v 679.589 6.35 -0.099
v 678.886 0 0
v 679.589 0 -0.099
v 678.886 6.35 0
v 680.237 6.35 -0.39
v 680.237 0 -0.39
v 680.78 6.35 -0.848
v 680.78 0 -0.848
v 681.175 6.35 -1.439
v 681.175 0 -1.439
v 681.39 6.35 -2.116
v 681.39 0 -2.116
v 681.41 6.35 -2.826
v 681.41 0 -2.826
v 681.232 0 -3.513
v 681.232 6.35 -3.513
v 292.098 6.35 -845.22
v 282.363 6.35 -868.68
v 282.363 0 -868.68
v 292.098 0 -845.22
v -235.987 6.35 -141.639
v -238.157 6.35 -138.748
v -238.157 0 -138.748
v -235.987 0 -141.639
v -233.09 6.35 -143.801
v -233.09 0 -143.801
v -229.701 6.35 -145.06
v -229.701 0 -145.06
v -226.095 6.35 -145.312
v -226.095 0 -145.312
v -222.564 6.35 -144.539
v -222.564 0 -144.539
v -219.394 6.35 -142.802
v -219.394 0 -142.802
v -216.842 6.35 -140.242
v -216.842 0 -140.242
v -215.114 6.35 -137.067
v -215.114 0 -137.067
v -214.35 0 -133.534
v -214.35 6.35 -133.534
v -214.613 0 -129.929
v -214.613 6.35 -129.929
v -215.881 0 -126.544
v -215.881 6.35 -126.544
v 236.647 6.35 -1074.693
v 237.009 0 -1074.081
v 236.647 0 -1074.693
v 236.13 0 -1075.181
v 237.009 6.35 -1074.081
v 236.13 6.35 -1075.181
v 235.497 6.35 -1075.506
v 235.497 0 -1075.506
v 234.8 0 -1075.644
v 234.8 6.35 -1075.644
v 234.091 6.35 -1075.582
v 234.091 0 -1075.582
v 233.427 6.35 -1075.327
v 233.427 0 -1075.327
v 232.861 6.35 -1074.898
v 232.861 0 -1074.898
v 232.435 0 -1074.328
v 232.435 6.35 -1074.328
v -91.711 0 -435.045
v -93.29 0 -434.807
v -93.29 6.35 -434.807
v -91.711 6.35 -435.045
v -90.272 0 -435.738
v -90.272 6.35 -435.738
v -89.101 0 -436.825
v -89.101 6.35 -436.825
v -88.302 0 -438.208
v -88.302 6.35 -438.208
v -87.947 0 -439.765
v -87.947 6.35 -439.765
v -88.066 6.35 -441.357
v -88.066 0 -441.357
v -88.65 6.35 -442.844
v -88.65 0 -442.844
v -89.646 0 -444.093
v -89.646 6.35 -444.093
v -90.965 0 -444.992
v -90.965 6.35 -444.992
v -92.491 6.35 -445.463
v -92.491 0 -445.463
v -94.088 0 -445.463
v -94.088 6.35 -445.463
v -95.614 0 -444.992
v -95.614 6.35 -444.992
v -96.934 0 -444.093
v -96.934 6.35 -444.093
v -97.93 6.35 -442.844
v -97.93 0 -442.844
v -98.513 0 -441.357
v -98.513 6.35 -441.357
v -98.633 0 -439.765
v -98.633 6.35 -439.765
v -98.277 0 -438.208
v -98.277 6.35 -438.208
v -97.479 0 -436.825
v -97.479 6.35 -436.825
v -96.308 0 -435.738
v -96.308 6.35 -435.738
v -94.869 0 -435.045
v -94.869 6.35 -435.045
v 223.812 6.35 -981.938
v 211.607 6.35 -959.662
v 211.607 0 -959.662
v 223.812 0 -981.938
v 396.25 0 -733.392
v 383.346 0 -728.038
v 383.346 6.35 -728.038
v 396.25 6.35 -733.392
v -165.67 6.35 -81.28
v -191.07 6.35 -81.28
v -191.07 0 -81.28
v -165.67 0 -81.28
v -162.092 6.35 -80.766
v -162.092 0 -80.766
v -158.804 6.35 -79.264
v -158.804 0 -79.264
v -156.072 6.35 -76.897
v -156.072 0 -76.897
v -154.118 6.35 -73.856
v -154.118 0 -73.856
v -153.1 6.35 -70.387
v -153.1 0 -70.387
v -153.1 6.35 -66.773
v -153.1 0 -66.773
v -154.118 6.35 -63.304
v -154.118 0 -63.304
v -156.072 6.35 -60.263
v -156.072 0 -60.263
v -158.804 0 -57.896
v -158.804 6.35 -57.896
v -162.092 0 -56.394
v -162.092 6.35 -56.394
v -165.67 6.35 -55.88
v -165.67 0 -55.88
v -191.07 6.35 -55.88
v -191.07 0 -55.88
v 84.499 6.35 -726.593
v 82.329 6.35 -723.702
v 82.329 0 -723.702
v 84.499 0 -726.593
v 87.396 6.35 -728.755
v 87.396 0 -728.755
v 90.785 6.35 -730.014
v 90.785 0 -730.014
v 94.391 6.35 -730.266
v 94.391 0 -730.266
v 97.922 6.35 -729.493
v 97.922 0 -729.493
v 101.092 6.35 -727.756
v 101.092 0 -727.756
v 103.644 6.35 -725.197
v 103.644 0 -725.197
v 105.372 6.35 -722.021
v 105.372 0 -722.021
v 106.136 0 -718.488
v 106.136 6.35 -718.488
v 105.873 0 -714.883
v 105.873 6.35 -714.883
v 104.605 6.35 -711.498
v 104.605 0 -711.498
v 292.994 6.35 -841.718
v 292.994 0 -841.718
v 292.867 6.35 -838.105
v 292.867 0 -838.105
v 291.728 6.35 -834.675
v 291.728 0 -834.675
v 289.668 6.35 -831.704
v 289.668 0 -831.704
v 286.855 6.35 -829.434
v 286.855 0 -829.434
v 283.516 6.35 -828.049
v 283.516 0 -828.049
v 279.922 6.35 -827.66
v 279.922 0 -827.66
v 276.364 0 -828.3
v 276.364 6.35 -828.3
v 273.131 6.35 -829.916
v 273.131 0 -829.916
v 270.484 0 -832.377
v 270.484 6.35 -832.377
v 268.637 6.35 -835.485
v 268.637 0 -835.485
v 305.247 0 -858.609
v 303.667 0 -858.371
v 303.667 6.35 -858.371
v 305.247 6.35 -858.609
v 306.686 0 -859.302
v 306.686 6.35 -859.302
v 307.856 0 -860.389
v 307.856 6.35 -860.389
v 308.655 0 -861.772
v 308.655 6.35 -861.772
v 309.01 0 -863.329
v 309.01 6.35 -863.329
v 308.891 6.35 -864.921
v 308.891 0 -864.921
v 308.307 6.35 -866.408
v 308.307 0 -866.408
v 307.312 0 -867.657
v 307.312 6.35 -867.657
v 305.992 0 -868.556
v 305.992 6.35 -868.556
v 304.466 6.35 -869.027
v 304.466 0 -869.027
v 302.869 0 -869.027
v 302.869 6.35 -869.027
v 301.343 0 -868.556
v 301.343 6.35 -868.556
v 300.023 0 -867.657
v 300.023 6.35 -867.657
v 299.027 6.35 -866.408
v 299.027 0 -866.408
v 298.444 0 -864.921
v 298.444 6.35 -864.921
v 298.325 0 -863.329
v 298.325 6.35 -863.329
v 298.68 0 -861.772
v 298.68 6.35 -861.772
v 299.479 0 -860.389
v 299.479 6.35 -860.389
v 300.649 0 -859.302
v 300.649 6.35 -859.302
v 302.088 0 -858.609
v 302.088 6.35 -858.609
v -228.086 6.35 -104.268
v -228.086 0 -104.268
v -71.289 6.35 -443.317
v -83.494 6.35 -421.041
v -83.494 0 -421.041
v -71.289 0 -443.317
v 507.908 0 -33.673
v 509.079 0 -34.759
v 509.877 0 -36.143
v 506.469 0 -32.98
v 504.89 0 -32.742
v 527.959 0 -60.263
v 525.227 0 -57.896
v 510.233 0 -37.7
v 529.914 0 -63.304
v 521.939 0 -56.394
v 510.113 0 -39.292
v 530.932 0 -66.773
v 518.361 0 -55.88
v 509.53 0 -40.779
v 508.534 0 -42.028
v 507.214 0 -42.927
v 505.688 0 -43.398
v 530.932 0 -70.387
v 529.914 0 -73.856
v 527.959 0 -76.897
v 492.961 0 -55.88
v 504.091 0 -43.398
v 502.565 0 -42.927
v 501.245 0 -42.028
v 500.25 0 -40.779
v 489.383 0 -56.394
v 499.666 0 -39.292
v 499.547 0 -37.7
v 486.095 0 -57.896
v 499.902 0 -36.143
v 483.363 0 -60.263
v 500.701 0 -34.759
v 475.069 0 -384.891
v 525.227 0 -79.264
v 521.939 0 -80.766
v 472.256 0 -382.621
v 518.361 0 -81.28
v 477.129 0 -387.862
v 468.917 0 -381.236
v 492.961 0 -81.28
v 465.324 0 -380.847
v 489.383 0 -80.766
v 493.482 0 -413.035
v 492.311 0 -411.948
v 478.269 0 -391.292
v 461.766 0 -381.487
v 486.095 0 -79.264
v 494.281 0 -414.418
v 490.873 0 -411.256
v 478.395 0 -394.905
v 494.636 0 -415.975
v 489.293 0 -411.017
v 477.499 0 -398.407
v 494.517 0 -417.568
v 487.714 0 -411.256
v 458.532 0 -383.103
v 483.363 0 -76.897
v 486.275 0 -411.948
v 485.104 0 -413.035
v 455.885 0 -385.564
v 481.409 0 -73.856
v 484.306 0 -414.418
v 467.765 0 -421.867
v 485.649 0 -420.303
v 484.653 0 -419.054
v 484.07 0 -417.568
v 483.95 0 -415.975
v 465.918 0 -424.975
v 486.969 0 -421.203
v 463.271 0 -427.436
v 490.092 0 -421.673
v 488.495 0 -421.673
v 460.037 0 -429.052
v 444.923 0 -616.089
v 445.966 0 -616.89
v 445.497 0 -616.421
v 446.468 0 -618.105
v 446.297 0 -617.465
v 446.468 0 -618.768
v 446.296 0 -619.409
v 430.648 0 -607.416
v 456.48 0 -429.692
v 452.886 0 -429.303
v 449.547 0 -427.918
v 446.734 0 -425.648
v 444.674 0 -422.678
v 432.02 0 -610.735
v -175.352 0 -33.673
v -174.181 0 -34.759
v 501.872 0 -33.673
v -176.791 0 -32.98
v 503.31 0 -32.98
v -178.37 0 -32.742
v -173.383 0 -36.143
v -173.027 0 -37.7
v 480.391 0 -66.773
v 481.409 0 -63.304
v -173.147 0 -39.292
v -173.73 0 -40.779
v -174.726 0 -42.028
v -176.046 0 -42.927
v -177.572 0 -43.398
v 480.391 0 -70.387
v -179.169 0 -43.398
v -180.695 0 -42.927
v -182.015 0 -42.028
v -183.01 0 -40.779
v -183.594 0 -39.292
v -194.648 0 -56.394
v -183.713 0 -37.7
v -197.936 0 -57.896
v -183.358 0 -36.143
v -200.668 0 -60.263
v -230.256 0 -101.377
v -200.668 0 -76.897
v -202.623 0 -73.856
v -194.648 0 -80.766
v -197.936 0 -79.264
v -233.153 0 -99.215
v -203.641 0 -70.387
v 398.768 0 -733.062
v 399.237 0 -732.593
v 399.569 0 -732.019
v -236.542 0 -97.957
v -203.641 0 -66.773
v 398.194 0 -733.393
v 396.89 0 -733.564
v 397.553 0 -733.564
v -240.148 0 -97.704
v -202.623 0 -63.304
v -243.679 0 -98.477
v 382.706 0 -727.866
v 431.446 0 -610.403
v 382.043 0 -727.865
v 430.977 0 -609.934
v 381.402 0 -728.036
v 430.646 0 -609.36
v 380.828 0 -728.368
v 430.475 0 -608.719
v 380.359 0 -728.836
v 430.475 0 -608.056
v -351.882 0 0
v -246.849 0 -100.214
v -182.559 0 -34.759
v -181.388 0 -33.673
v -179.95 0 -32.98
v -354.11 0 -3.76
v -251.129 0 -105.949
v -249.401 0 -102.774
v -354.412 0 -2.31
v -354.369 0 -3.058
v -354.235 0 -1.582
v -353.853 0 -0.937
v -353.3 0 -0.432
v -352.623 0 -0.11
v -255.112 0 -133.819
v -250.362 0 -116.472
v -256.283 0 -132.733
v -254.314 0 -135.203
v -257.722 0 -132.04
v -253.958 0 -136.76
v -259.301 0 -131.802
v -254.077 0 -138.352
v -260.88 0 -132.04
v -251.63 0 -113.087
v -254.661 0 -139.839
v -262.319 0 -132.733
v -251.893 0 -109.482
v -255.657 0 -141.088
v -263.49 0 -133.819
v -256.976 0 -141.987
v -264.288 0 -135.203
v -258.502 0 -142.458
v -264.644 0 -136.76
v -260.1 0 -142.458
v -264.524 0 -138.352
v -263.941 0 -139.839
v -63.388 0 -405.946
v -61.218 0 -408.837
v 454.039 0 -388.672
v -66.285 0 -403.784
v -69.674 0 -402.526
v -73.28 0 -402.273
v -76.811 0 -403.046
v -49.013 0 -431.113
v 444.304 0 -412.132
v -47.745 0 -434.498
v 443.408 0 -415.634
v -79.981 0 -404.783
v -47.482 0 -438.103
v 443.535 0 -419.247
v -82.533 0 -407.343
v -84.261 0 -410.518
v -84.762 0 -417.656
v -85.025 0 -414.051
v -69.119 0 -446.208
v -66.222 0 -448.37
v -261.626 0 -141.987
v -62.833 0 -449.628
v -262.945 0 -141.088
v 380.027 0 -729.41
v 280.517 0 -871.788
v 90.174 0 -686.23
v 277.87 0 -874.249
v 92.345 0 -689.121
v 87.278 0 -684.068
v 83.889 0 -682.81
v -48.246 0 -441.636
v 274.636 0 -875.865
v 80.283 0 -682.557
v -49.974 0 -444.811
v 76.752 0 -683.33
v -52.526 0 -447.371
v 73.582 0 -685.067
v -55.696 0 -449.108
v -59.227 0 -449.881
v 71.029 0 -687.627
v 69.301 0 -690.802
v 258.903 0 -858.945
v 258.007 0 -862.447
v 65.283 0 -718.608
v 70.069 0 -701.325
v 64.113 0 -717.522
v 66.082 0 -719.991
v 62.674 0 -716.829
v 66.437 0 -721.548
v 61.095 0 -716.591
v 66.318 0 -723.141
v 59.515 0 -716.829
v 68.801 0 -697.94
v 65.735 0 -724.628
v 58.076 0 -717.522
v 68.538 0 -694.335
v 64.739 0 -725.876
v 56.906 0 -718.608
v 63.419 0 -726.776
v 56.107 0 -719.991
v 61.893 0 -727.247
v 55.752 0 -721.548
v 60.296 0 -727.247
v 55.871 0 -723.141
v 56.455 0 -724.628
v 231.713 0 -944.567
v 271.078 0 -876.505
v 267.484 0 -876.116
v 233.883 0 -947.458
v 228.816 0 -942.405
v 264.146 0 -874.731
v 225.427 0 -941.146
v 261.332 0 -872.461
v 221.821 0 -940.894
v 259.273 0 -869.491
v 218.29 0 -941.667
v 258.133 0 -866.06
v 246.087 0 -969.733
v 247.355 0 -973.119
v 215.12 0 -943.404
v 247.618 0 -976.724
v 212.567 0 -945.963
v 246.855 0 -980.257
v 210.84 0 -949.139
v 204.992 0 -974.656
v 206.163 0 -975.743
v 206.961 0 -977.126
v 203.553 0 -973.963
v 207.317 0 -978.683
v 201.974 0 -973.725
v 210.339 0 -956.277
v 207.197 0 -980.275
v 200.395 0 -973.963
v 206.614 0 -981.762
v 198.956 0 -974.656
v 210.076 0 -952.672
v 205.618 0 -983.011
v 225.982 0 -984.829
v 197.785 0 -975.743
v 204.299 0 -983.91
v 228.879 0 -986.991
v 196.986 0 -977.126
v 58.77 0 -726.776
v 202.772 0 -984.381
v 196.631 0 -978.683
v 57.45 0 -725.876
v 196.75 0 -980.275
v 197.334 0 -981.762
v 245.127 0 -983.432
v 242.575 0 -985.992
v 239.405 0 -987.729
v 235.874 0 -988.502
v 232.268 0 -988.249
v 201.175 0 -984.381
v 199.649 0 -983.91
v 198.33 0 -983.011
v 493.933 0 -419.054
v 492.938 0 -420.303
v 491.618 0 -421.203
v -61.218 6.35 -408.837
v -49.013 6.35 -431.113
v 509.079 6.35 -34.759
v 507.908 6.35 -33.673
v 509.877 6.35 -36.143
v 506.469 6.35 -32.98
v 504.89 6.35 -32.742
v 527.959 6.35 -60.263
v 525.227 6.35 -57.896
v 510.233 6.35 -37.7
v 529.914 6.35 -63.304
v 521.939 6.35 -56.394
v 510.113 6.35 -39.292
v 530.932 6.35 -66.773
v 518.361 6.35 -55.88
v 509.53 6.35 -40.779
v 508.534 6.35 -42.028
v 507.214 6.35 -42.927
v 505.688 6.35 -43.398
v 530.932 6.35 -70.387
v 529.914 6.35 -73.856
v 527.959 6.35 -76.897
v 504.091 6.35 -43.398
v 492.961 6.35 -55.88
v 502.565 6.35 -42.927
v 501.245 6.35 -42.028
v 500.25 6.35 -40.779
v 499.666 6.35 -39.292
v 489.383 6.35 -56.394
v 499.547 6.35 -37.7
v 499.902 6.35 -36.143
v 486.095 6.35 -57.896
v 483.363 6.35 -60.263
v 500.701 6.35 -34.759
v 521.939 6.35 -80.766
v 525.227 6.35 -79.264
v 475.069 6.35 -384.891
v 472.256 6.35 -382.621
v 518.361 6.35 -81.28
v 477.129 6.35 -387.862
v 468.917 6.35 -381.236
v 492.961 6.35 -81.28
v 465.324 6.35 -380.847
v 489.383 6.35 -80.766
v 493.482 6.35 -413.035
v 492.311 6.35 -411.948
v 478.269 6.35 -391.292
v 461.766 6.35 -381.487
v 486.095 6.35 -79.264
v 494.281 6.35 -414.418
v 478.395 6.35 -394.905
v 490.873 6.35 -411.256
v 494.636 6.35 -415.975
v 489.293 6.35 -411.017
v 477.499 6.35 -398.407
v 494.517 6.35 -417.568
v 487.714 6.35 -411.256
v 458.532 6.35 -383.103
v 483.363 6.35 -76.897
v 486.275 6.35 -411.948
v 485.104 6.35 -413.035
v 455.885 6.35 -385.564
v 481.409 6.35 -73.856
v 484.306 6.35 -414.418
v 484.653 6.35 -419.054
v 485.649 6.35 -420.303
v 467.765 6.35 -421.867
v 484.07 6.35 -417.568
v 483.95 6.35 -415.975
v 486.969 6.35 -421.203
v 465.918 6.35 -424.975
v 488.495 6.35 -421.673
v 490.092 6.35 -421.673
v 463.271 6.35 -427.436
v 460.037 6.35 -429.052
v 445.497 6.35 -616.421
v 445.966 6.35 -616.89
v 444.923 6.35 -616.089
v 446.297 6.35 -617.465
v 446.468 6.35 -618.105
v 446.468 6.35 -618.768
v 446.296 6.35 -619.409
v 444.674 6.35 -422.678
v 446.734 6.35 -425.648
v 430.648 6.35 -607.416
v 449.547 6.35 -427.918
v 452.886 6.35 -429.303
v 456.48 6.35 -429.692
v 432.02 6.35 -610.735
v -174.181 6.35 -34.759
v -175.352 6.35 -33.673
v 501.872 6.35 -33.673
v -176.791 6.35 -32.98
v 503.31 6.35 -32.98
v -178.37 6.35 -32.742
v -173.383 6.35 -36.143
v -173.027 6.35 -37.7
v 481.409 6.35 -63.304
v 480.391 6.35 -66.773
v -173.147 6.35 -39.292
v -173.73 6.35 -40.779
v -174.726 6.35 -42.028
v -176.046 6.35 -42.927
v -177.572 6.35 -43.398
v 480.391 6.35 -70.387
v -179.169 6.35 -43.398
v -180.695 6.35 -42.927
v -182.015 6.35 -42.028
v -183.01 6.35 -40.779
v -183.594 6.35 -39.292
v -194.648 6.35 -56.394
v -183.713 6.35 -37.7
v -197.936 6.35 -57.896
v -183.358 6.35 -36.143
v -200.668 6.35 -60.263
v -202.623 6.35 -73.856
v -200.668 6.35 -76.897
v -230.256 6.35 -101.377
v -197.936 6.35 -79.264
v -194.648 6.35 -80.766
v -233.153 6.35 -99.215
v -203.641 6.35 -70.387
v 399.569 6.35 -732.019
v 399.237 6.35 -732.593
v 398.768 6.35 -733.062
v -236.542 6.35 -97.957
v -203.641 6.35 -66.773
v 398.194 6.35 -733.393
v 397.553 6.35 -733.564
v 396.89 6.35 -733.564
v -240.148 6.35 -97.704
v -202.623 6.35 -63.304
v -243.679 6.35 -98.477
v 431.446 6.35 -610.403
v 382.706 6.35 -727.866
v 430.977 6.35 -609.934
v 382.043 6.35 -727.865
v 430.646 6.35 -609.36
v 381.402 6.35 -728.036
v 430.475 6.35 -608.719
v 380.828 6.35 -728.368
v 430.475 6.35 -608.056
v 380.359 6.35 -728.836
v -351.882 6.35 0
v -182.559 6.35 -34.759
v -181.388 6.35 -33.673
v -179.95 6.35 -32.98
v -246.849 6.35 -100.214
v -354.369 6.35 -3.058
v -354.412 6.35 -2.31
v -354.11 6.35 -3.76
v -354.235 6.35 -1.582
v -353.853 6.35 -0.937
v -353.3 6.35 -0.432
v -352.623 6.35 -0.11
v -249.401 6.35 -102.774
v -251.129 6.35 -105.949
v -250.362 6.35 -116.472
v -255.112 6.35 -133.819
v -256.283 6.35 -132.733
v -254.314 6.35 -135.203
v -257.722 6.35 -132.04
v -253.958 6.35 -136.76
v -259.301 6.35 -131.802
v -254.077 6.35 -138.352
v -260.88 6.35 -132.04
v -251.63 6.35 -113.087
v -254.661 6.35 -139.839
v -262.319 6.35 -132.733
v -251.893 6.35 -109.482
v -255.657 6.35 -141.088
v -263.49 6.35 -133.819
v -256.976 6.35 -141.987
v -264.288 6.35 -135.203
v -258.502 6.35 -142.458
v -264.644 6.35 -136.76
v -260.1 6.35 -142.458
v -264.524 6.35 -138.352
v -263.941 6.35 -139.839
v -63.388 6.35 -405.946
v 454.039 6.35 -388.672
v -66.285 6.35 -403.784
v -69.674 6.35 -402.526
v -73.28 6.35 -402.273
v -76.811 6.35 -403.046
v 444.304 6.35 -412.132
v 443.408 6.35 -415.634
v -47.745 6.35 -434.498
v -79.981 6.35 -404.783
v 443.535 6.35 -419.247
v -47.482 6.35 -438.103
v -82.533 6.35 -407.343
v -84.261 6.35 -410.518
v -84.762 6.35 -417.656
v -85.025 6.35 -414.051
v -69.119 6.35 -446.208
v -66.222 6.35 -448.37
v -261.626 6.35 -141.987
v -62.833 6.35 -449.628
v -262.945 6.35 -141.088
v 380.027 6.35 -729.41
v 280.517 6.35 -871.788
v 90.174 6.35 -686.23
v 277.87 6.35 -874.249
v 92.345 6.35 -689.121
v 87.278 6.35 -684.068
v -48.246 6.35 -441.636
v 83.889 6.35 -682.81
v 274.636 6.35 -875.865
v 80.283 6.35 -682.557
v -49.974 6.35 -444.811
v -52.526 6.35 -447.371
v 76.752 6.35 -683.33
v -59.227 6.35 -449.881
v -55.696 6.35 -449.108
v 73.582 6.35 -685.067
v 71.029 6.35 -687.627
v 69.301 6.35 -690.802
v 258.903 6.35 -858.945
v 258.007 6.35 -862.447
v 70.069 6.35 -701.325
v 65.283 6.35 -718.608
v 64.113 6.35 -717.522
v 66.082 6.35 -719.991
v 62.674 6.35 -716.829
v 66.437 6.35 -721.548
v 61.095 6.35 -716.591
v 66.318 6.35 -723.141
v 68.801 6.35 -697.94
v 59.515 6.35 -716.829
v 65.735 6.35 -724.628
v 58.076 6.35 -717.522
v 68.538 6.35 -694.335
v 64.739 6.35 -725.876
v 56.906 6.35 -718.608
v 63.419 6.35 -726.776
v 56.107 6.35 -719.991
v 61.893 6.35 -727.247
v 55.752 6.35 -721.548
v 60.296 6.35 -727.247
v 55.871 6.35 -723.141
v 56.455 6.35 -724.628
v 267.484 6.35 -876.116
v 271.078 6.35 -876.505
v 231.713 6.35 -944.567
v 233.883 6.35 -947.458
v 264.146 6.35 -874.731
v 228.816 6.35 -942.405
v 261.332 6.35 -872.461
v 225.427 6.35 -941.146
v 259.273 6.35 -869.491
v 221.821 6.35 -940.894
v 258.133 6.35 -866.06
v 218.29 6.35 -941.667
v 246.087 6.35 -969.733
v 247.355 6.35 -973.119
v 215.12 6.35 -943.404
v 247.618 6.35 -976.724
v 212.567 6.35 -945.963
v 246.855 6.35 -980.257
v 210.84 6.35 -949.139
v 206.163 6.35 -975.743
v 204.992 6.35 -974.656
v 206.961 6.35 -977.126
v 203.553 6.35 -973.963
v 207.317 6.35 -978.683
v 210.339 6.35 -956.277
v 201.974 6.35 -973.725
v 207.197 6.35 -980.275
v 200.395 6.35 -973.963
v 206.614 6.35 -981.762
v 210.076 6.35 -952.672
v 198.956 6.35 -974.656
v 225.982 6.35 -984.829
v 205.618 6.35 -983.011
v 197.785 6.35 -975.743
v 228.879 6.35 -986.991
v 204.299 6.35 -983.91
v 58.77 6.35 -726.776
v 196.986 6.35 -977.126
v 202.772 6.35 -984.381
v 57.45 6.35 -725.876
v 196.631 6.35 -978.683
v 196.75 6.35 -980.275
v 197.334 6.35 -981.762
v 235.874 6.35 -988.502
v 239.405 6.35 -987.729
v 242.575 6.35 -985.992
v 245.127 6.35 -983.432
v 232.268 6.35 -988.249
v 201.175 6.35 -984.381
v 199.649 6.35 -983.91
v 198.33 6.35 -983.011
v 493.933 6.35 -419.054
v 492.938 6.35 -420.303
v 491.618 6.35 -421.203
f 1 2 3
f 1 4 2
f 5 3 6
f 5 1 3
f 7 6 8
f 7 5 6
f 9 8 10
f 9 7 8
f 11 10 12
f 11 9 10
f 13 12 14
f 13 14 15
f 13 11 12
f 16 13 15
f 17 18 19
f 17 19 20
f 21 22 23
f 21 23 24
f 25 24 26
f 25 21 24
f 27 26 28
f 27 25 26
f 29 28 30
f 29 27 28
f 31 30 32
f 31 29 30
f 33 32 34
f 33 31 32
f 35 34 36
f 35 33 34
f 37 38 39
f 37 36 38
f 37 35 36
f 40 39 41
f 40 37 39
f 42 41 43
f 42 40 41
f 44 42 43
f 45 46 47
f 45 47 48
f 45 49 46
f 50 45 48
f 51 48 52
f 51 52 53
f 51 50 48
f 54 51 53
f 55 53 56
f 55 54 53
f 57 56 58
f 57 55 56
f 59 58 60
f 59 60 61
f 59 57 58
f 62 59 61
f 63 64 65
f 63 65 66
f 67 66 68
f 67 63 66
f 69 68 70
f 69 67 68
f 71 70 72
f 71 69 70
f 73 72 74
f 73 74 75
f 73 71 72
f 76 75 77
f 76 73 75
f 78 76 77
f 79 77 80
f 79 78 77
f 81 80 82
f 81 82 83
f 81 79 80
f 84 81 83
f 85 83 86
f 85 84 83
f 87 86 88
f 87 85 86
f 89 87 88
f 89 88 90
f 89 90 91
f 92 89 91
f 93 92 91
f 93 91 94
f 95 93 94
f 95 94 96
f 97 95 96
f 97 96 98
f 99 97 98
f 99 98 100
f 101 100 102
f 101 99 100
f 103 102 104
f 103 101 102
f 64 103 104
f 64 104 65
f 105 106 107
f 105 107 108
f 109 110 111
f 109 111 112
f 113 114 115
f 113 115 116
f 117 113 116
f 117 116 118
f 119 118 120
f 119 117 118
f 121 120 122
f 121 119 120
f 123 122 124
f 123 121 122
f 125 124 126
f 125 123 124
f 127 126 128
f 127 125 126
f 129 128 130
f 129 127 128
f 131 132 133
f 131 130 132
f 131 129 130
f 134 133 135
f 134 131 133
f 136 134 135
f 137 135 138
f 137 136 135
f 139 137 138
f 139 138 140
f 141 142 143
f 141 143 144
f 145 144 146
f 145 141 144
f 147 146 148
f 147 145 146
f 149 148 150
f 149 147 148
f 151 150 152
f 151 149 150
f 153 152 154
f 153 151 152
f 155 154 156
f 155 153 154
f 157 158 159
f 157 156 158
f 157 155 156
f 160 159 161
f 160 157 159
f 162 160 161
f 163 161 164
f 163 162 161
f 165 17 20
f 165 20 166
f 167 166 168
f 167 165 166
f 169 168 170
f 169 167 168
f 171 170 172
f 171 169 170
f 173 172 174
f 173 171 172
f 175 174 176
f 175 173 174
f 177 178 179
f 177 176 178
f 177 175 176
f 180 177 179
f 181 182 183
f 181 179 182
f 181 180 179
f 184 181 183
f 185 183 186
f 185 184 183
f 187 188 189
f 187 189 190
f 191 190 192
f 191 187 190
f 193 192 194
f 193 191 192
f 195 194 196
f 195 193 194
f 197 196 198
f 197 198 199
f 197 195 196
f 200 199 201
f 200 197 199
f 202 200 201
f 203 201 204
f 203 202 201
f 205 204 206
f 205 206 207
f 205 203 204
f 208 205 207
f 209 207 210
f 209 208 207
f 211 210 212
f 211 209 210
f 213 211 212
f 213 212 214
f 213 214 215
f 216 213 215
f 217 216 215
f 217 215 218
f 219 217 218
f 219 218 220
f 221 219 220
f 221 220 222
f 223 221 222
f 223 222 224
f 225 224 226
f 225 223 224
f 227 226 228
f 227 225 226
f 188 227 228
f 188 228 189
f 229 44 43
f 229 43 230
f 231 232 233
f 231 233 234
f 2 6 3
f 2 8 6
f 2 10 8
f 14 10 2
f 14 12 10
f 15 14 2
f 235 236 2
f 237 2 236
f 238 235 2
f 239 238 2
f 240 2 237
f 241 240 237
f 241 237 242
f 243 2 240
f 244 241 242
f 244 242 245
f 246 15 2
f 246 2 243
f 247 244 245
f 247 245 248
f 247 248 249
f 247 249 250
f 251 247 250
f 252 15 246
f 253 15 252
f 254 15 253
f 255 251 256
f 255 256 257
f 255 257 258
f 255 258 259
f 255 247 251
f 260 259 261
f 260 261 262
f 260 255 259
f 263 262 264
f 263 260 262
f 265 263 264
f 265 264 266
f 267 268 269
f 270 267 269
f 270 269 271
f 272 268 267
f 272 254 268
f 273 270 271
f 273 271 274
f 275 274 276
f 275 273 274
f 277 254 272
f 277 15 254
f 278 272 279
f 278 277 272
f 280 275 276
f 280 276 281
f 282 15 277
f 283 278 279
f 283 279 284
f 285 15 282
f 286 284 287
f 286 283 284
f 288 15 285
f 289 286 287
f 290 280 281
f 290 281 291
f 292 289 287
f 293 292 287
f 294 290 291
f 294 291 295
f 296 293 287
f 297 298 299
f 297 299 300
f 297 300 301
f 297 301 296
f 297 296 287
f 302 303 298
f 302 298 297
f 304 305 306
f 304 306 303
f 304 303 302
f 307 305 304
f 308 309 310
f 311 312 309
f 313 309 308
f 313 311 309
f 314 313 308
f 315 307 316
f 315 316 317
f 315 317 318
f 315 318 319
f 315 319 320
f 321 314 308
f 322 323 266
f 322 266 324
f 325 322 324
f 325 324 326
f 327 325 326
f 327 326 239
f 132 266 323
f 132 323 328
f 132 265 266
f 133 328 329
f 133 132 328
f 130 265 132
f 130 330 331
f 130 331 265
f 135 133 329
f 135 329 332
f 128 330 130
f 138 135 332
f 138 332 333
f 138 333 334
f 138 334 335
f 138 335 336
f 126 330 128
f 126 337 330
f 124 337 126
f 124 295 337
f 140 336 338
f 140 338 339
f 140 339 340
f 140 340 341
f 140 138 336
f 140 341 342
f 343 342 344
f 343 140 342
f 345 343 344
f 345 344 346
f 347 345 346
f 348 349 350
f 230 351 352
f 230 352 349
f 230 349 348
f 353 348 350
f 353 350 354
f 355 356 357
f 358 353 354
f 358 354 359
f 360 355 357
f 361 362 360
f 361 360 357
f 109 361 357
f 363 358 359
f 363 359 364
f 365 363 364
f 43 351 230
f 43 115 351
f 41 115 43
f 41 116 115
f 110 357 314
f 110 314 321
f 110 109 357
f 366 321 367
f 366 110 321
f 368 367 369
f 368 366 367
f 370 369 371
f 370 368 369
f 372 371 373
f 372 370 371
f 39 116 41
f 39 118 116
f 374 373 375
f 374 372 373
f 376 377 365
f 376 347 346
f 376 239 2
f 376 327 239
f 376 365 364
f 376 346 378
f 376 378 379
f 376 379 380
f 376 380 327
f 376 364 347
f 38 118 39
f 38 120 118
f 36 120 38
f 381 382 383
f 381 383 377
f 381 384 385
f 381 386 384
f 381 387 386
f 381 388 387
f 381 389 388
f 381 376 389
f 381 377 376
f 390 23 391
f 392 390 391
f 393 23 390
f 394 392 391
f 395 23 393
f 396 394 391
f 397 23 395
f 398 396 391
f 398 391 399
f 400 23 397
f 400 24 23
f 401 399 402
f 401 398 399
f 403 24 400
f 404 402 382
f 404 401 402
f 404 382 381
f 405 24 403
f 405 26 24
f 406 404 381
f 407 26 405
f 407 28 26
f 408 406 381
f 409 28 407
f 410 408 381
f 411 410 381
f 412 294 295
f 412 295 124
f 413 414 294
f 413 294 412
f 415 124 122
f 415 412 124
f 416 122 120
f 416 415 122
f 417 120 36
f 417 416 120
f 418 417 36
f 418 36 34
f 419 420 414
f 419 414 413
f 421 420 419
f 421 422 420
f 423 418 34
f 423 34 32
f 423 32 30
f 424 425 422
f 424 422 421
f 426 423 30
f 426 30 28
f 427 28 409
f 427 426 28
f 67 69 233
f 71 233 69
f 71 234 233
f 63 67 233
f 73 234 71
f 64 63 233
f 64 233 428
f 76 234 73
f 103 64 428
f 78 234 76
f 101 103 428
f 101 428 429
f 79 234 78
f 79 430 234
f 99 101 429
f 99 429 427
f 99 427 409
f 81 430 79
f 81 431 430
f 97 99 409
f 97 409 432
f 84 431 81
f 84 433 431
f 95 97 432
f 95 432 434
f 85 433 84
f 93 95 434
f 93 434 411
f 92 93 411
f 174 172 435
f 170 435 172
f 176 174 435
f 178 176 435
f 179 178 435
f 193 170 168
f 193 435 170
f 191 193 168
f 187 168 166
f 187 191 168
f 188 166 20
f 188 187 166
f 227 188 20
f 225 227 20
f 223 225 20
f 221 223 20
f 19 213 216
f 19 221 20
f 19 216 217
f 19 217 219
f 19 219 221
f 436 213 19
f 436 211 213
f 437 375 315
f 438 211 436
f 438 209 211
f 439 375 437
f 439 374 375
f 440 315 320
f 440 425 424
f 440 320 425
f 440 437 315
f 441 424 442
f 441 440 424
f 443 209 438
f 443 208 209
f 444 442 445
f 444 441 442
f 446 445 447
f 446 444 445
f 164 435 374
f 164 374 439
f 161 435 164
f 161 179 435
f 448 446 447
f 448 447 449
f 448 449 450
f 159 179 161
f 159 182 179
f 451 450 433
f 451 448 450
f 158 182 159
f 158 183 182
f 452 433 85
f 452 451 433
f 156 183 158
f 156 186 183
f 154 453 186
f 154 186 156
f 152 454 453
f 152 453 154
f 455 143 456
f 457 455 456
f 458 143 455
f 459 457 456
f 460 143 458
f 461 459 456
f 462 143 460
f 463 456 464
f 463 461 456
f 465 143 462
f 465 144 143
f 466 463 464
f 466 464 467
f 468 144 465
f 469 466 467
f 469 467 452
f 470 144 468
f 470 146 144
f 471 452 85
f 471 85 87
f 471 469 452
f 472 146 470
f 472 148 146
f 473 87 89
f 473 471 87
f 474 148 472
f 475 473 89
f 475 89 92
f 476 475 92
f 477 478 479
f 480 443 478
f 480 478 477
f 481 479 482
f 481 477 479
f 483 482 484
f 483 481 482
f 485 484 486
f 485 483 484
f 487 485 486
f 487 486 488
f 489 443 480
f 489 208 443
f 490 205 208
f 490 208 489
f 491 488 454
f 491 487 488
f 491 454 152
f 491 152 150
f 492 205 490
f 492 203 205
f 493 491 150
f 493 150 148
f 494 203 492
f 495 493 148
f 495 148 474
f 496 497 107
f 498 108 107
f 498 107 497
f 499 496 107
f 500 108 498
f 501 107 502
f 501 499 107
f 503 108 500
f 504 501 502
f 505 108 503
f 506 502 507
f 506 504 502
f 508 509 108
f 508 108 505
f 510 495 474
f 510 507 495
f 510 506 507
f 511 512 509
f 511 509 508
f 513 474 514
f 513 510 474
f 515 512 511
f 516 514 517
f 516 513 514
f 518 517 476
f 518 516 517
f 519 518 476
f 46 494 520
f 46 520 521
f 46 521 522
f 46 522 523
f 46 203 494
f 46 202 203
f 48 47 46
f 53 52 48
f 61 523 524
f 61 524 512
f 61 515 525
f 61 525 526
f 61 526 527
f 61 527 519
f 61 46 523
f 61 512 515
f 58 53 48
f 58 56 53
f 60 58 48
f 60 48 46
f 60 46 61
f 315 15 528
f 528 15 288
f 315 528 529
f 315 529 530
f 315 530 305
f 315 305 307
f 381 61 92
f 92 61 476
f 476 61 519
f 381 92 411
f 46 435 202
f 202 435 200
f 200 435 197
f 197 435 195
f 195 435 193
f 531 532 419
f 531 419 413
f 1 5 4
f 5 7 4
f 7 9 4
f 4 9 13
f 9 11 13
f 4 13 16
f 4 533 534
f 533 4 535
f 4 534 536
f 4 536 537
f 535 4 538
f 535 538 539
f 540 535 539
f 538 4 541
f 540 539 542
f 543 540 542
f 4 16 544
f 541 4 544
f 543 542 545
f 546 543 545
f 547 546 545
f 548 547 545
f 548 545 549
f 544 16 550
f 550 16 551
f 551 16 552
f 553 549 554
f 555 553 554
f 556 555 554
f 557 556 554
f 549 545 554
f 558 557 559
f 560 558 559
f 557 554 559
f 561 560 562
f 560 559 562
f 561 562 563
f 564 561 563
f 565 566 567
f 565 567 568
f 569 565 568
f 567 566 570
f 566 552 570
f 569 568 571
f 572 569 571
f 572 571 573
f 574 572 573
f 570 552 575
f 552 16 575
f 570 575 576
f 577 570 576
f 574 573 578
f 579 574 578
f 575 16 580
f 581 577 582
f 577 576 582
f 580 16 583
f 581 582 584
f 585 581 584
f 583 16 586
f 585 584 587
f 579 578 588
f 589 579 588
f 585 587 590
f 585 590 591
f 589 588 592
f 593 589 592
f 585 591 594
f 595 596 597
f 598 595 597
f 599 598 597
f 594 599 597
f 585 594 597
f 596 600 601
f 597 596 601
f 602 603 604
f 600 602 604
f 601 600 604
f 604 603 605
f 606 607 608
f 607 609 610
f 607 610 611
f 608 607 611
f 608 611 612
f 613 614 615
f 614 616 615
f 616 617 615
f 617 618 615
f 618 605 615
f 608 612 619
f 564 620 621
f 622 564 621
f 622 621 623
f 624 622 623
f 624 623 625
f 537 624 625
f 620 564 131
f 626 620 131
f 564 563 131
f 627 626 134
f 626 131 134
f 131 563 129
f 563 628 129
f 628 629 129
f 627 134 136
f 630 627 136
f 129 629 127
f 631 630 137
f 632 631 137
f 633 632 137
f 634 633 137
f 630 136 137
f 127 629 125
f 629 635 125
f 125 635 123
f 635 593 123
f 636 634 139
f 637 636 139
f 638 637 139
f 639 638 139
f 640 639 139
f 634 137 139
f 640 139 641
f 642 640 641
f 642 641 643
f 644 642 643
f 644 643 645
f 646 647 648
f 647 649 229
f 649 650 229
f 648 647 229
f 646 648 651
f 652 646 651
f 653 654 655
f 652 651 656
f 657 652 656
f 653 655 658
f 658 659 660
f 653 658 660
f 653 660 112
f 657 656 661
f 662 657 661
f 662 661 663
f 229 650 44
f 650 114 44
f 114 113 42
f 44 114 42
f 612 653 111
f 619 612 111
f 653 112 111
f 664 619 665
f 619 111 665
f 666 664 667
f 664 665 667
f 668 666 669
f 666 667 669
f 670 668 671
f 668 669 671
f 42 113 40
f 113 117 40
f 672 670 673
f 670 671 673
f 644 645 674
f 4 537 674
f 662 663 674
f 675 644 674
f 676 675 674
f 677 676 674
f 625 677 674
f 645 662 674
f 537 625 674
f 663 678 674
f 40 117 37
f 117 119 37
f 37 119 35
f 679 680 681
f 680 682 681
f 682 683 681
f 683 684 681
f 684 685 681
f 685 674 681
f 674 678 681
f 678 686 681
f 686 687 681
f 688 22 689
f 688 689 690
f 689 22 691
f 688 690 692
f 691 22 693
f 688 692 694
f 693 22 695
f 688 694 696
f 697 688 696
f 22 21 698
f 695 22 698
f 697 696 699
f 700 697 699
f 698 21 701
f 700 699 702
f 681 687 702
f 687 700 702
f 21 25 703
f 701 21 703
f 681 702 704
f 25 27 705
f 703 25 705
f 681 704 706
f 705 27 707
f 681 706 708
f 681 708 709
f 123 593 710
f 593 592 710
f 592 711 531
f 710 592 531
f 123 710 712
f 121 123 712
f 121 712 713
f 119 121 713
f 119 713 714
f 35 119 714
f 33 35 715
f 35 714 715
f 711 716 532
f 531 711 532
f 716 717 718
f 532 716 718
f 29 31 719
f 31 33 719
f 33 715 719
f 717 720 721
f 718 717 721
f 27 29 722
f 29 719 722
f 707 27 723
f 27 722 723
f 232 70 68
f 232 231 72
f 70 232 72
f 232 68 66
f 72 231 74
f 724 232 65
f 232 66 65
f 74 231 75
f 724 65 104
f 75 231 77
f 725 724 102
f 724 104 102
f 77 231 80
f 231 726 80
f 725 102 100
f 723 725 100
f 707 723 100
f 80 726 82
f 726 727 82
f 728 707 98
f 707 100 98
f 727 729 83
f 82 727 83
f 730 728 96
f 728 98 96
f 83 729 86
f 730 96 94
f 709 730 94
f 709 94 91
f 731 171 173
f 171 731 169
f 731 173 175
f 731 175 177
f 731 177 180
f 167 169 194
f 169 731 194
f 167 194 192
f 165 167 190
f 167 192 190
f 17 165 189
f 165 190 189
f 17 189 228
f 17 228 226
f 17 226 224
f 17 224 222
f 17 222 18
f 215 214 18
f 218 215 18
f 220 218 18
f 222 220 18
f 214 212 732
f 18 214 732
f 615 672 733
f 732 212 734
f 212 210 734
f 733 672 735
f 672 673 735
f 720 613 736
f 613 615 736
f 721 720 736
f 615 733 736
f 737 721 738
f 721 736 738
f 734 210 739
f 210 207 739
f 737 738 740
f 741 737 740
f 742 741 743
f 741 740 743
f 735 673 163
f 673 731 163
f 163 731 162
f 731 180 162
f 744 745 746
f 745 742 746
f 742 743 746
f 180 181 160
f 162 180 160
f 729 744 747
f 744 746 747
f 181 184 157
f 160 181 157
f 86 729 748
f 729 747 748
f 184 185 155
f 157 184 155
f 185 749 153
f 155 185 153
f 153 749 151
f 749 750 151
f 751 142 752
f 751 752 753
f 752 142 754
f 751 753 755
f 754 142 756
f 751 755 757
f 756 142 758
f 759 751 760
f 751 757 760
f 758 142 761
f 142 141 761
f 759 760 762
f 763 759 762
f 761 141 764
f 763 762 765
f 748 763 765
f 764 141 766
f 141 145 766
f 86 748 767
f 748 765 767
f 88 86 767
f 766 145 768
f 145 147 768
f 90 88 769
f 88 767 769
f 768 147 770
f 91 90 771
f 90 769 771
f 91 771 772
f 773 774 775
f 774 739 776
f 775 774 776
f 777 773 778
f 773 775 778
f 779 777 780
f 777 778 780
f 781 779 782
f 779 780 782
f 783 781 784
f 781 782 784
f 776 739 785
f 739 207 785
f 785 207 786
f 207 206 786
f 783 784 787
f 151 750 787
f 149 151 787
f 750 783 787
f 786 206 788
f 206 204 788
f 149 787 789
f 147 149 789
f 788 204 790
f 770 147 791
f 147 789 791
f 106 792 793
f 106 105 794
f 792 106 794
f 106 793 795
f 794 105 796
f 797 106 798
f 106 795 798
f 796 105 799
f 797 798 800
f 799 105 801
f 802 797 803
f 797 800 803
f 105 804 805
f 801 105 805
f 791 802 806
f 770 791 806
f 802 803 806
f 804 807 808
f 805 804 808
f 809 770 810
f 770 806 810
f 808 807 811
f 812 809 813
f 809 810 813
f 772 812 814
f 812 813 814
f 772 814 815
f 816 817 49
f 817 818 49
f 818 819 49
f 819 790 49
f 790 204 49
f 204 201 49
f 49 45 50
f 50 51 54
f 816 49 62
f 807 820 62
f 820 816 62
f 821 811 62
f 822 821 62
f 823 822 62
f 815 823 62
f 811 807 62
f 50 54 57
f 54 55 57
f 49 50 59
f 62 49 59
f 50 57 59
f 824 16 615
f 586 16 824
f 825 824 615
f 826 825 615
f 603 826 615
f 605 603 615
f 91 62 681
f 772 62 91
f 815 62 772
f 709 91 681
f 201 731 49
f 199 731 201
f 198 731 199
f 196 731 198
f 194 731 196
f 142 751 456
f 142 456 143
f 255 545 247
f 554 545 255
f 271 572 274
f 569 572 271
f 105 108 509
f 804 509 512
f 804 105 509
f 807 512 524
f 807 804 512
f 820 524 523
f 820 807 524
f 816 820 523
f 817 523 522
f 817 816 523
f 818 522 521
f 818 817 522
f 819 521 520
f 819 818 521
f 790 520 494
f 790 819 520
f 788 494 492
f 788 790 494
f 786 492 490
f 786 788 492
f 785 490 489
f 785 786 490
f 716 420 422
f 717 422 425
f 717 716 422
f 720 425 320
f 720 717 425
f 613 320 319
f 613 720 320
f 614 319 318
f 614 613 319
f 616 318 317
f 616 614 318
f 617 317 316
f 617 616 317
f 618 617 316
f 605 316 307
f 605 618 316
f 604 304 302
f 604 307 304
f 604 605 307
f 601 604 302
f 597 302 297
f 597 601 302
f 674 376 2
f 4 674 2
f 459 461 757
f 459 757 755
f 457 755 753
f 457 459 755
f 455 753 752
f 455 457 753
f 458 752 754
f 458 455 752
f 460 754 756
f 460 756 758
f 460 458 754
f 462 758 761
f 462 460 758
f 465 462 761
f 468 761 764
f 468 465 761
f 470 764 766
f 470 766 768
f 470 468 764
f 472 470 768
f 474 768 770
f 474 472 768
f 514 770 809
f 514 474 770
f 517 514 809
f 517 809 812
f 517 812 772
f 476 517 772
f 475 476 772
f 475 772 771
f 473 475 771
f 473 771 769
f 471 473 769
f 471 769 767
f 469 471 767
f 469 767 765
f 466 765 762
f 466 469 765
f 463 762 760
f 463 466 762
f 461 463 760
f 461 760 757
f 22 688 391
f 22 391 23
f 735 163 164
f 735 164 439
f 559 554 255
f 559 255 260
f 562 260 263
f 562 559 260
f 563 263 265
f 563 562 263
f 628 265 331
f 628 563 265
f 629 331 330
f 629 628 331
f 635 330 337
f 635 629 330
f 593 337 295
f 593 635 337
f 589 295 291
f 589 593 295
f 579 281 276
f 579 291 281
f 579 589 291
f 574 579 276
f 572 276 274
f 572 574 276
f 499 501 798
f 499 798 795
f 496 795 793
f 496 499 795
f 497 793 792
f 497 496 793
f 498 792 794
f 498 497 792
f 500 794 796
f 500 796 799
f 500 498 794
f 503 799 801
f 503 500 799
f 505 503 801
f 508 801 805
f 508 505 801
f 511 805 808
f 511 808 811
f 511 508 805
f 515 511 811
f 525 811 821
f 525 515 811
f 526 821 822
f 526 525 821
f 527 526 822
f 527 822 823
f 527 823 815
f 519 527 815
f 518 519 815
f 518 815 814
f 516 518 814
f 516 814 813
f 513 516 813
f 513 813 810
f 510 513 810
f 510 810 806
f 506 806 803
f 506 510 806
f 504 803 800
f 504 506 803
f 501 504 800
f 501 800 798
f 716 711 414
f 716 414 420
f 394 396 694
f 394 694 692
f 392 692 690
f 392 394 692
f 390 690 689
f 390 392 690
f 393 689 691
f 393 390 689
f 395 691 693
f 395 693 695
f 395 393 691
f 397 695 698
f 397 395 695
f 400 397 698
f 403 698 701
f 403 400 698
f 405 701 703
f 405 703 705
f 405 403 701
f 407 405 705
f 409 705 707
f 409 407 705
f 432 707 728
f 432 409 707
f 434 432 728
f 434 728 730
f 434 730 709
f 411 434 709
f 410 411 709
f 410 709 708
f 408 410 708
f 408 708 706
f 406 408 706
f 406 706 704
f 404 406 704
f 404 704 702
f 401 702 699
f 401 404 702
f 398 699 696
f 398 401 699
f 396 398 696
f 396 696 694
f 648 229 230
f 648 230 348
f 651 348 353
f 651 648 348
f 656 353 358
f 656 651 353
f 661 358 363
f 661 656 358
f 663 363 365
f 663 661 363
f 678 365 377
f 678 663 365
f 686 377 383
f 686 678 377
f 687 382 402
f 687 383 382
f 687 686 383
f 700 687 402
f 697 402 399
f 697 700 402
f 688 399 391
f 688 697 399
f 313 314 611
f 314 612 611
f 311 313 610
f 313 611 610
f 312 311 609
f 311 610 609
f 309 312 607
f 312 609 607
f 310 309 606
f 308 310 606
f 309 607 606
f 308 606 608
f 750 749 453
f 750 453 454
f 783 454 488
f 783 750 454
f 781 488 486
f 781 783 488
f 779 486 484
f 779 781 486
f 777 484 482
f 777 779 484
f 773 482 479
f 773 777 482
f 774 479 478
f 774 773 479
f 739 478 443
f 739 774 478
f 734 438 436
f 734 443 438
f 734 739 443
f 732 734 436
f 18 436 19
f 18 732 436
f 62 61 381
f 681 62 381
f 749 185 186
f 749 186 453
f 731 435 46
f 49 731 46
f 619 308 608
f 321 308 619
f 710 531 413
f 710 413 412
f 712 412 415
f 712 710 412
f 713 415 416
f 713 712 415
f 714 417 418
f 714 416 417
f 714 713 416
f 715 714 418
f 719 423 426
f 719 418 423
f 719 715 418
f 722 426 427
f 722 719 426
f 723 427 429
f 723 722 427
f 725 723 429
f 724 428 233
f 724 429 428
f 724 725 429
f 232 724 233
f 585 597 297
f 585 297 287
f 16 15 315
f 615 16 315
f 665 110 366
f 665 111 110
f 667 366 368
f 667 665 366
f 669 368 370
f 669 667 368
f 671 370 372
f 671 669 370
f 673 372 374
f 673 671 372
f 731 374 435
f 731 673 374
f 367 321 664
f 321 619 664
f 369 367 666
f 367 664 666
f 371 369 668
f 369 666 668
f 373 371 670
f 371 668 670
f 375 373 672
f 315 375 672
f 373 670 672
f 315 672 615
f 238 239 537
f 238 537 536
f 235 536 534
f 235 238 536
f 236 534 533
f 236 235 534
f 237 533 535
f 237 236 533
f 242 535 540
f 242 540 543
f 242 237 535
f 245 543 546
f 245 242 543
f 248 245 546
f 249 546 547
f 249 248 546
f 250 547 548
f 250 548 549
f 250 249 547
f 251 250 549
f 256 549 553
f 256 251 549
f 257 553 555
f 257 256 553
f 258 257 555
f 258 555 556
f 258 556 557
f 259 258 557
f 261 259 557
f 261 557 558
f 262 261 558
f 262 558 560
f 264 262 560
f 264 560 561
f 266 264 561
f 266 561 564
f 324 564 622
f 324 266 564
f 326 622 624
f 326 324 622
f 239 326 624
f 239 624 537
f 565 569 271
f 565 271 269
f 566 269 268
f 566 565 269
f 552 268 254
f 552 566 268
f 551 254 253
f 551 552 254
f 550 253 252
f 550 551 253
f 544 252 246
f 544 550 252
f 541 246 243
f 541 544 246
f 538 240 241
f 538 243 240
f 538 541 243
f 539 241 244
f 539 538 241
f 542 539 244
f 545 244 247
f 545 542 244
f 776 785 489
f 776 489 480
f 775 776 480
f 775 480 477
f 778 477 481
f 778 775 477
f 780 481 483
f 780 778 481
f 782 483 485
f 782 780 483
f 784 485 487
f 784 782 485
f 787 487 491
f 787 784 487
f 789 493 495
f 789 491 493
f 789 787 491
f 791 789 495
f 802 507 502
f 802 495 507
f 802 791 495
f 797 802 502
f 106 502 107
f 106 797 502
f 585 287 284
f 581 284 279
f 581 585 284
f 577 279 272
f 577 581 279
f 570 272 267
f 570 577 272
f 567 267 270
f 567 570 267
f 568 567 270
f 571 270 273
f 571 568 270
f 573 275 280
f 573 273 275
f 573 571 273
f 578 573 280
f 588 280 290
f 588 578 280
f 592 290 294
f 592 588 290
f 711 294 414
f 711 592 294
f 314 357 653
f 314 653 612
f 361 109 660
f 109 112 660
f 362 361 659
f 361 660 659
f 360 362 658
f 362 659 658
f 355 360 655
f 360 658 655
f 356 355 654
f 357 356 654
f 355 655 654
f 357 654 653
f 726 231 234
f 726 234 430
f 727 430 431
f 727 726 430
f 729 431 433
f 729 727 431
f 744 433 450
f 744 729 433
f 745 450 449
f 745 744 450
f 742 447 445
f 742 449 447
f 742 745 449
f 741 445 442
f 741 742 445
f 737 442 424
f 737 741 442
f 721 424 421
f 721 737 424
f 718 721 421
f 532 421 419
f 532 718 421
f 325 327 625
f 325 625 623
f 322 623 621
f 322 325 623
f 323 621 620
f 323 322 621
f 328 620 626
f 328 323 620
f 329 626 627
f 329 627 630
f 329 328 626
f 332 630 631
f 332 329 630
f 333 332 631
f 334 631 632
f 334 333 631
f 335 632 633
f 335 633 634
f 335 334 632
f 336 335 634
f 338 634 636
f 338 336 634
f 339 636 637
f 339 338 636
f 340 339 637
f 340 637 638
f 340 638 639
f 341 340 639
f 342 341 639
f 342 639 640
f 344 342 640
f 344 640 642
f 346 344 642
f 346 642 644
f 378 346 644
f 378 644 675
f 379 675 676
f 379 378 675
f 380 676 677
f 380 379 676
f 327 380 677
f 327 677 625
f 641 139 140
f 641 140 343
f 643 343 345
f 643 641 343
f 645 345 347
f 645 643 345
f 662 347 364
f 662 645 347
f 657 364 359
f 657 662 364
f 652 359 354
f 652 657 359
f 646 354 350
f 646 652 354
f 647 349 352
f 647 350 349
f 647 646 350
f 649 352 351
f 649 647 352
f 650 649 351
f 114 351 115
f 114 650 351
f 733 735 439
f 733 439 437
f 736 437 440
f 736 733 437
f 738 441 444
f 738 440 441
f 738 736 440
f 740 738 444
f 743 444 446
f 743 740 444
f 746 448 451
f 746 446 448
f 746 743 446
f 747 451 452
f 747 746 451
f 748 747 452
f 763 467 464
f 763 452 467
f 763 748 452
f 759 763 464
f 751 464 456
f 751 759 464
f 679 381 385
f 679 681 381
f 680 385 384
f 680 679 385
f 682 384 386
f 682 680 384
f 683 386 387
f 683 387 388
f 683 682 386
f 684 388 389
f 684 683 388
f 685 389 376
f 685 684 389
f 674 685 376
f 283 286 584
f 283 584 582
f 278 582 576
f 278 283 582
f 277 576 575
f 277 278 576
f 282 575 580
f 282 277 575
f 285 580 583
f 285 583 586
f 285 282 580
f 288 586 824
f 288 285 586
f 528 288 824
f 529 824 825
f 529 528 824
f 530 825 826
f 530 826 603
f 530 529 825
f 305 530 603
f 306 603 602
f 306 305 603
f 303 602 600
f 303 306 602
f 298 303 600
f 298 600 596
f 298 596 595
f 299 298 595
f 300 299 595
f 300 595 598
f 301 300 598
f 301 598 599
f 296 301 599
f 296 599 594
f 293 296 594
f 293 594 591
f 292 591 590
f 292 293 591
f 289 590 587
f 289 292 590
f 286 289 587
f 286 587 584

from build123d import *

# Parameters (mm, degrees)
SKETCH4_R           = 5.3578125
BOSS_EXTRUDE2_DEPTH = 6.35
CUT_EXTRUDE1_DEPTH  = 1277.826258948
FILLET1_R           = 2.54


with BuildPart() as part:
    # Sketch4 → Boss-Extrude2 (new body)
    # profile 1 of 2: a face of its own
    with BuildSketch(Plane(origin=(0, 0, 0), x_dir=(1, 0, 0), z_dir=(0, 1, 0))):
        Polygon((234.979236566, 1078.971634327), (-356.170330123, 0), (682.689669877, 0), (429.674039163, 609.761730508), (381.000338514, 727.064206463), align=None)
        with Locations(Location((-178.370330123, 38.1, 0), (0, 0, 270))):
            Circle(SKETCH4_R, mode=Mode.SUBTRACT)
        with Locations(Location((-259.300975608, 137.16, 0), (0, 0, 270))):
            Circle(SKETCH4_R, mode=Mode.SUBTRACT)
        with Locations(Location((-93.289784566, 440.165155055, 0), (0, 0, 270))):
            Circle(SKETCH4_R, mode=Mode.SUBTRACT)
        with Locations(Location((504.889669877, 38.1, 0), (0, 0, 270))):
            Circle(SKETCH4_R, mode=Mode.SUBTRACT)
        with Locations(Location((489.29326545, 416.375307605, 0), (0, 0, 270))):
            Circle(SKETCH4_R, mode=Mode.SUBTRACT)
        with Locations(Location((61.094542054, 721.948850069, 0), (0, 0, 270))):
            Circle(SKETCH4_R, mode=Mode.SUBTRACT)
        with Locations(Location((303.667495105, 863.729056592, 0), (0, 0, 270))):
            Circle(SKETCH4_R, mode=Mode.SUBTRACT)
        with Locations(Location((201.97392089, 979.083189991, 0), (0, 0, 270))):
            Circle(SKETCH4_R, mode=Mode.SUBTRACT)
    # profile 2 of 2: a face of its own
    with BuildSketch(Plane(origin=(0, 0, 0), x_dir=(1, 0, 0), z_dir=(0, 1, 0))):
        Polygon((429.674039163, 609.761730508), (381.000338514, 727.064206463), (398.595709907, 734.36526156), (447.269410556, 617.062785606), align=None)
    extrude(amount=BOSS_EXTRUDE2_DEPTH)

    # Sketch5 → Cut-Extrude1 (cut, through all)
    with BuildSketch(Plane(origin=(0, 6.35, 0), x_dir=(1, 0, 0), z_dir=(0, 1, 0))):
        with BuildLine():
            Line((-250.361653335, 116.472417753), (-238.157149202, 138.748191115))
            ThreePointArc((-238.157149202, 138.748191115), (-220.917010455, 143.783825729), (-215.88137584, 126.543686982))
            Line((-215.88137584, 126.543686982), (-228.085879973, 104.26791362))
            ThreePointArc((-228.085879973, 104.26791362), (-245.326018721, 99.232279006), (-250.361653335, 116.472417753))
        make_face()
        with BuildLine():
            Line((-191.070330123, 81.28), (-165.670330123, 81.28))
            ThreePointArc((-165.670330123, 81.28), (-152.970330123, 68.58), (-165.670330123, 55.88))
            Line((-165.670330123, 55.88), (-191.070330123, 55.88))
            ThreePointArc((-191.070330123, 55.88), (-203.770330123, 68.58), (-191.070330123, 81.28))
        make_face()
        with BuildLine():
            Line((-83.493702347, 421.041338954), (-71.289198214, 443.317112316))
            ThreePointArc((-71.289198214, 443.317112316), (-54.049059466, 448.35274693), (-49.013424852, 431.112608183))
            Line((-49.013424852, 431.112608183), (-61.217928985, 408.836834821))
            ThreePointArc((-61.217928985, 408.836834821), (-78.458067732, 403.801200206), (-83.493702347, 421.041338954))
        make_face()
        with BuildLine():
            Line((211.607161604, 959.662154075), (223.811665737, 981.937927436))
            ThreePointArc((223.811665737, 981.937927436), (241.051804485, 986.973562051), (246.087439099, 969.733423303))
            Line((246.087439099, 969.733423303), (233.882934966, 947.457649942))
            ThreePointArc((233.882934966, 947.457649942), (216.642796219, 942.422015327), (211.607161604, 959.662154075))
        make_face()
        with BuildLine():
            Line((70.0689996, 701.325397046), (82.328936684, 723.702347141))
            ThreePointArc((82.328936684, 723.702347141), (99.569075432, 728.737981755), (104.604710046, 711.497843008))
            Line((104.604710046, 711.497843008), (92.344772962, 689.120892913))
            ThreePointArc((92.344772962, 689.120892913), (75.104634214, 684.085258298), (70.0689996, 701.325397046))
        make_face()
        with BuildLine():
            Line((467.764558528, 421.867197937), (477.499298658, 398.406702746))
            ThreePointArc((477.499298658, 398.406702746), (470.636421128, 381.809085085), (454.038803467, 388.671962616))
            Line((454.038803467, 388.671962616), (444.304063337, 412.132457807))
            ThreePointArc((444.304063337, 412.132457807), (451.166940868, 428.730075467), (467.764558528, 421.867197937))
        make_face()
        with BuildLine():
            Line((492.961263737, 81.28), (518.361263737, 81.28))
            ThreePointArc((518.361263737, 81.28), (531.061263737, 68.58), (518.361263737, 55.88))
            Line((518.361263737, 55.88), (492.961263737, 55.88))
            ThreePointArc((492.961263737, 55.88), (480.261263737, 68.58), (492.961263737, 81.28))
        make_face()
        with BuildLine():
            Line((282.363160209, 868.680215609), (292.097900339, 845.219720419))
            ThreePointArc((292.097900339, 845.219720419), (285.235022808, 828.622102758), (268.637405148, 835.484980289))
            Line((268.637405148, 835.484980289), (258.902665018, 858.94547548))
            ThreePointArc((258.902665018, 858.94547548), (265.765542549, 875.54309314), (282.363160209, 868.680215609))
        make_face()
    extrude(amount=-CUT_EXTRUDE1_DEPTH, mode=Mode.SUBTRACT)

    # Fillet1
    fillet1_edges = [part.edges().sort_by_distance(p)[0] for p in [
        (682.689669877, 3.175, 0),
        (-356.170330123, 3.175, 0),
        (234.979236566, 3.175, -1078.971634327),
        (381.000338514, 3.175, -727.064206463),
        (429.674039163, 3.175, -609.761730508),
        (447.269410556, 3.175, -617.062785606),
        (398.595709907, 3.175, -734.36526156),
    ]]
    fillet(fillet1_edges, radius=FILLET1_R)


solid = part.part
